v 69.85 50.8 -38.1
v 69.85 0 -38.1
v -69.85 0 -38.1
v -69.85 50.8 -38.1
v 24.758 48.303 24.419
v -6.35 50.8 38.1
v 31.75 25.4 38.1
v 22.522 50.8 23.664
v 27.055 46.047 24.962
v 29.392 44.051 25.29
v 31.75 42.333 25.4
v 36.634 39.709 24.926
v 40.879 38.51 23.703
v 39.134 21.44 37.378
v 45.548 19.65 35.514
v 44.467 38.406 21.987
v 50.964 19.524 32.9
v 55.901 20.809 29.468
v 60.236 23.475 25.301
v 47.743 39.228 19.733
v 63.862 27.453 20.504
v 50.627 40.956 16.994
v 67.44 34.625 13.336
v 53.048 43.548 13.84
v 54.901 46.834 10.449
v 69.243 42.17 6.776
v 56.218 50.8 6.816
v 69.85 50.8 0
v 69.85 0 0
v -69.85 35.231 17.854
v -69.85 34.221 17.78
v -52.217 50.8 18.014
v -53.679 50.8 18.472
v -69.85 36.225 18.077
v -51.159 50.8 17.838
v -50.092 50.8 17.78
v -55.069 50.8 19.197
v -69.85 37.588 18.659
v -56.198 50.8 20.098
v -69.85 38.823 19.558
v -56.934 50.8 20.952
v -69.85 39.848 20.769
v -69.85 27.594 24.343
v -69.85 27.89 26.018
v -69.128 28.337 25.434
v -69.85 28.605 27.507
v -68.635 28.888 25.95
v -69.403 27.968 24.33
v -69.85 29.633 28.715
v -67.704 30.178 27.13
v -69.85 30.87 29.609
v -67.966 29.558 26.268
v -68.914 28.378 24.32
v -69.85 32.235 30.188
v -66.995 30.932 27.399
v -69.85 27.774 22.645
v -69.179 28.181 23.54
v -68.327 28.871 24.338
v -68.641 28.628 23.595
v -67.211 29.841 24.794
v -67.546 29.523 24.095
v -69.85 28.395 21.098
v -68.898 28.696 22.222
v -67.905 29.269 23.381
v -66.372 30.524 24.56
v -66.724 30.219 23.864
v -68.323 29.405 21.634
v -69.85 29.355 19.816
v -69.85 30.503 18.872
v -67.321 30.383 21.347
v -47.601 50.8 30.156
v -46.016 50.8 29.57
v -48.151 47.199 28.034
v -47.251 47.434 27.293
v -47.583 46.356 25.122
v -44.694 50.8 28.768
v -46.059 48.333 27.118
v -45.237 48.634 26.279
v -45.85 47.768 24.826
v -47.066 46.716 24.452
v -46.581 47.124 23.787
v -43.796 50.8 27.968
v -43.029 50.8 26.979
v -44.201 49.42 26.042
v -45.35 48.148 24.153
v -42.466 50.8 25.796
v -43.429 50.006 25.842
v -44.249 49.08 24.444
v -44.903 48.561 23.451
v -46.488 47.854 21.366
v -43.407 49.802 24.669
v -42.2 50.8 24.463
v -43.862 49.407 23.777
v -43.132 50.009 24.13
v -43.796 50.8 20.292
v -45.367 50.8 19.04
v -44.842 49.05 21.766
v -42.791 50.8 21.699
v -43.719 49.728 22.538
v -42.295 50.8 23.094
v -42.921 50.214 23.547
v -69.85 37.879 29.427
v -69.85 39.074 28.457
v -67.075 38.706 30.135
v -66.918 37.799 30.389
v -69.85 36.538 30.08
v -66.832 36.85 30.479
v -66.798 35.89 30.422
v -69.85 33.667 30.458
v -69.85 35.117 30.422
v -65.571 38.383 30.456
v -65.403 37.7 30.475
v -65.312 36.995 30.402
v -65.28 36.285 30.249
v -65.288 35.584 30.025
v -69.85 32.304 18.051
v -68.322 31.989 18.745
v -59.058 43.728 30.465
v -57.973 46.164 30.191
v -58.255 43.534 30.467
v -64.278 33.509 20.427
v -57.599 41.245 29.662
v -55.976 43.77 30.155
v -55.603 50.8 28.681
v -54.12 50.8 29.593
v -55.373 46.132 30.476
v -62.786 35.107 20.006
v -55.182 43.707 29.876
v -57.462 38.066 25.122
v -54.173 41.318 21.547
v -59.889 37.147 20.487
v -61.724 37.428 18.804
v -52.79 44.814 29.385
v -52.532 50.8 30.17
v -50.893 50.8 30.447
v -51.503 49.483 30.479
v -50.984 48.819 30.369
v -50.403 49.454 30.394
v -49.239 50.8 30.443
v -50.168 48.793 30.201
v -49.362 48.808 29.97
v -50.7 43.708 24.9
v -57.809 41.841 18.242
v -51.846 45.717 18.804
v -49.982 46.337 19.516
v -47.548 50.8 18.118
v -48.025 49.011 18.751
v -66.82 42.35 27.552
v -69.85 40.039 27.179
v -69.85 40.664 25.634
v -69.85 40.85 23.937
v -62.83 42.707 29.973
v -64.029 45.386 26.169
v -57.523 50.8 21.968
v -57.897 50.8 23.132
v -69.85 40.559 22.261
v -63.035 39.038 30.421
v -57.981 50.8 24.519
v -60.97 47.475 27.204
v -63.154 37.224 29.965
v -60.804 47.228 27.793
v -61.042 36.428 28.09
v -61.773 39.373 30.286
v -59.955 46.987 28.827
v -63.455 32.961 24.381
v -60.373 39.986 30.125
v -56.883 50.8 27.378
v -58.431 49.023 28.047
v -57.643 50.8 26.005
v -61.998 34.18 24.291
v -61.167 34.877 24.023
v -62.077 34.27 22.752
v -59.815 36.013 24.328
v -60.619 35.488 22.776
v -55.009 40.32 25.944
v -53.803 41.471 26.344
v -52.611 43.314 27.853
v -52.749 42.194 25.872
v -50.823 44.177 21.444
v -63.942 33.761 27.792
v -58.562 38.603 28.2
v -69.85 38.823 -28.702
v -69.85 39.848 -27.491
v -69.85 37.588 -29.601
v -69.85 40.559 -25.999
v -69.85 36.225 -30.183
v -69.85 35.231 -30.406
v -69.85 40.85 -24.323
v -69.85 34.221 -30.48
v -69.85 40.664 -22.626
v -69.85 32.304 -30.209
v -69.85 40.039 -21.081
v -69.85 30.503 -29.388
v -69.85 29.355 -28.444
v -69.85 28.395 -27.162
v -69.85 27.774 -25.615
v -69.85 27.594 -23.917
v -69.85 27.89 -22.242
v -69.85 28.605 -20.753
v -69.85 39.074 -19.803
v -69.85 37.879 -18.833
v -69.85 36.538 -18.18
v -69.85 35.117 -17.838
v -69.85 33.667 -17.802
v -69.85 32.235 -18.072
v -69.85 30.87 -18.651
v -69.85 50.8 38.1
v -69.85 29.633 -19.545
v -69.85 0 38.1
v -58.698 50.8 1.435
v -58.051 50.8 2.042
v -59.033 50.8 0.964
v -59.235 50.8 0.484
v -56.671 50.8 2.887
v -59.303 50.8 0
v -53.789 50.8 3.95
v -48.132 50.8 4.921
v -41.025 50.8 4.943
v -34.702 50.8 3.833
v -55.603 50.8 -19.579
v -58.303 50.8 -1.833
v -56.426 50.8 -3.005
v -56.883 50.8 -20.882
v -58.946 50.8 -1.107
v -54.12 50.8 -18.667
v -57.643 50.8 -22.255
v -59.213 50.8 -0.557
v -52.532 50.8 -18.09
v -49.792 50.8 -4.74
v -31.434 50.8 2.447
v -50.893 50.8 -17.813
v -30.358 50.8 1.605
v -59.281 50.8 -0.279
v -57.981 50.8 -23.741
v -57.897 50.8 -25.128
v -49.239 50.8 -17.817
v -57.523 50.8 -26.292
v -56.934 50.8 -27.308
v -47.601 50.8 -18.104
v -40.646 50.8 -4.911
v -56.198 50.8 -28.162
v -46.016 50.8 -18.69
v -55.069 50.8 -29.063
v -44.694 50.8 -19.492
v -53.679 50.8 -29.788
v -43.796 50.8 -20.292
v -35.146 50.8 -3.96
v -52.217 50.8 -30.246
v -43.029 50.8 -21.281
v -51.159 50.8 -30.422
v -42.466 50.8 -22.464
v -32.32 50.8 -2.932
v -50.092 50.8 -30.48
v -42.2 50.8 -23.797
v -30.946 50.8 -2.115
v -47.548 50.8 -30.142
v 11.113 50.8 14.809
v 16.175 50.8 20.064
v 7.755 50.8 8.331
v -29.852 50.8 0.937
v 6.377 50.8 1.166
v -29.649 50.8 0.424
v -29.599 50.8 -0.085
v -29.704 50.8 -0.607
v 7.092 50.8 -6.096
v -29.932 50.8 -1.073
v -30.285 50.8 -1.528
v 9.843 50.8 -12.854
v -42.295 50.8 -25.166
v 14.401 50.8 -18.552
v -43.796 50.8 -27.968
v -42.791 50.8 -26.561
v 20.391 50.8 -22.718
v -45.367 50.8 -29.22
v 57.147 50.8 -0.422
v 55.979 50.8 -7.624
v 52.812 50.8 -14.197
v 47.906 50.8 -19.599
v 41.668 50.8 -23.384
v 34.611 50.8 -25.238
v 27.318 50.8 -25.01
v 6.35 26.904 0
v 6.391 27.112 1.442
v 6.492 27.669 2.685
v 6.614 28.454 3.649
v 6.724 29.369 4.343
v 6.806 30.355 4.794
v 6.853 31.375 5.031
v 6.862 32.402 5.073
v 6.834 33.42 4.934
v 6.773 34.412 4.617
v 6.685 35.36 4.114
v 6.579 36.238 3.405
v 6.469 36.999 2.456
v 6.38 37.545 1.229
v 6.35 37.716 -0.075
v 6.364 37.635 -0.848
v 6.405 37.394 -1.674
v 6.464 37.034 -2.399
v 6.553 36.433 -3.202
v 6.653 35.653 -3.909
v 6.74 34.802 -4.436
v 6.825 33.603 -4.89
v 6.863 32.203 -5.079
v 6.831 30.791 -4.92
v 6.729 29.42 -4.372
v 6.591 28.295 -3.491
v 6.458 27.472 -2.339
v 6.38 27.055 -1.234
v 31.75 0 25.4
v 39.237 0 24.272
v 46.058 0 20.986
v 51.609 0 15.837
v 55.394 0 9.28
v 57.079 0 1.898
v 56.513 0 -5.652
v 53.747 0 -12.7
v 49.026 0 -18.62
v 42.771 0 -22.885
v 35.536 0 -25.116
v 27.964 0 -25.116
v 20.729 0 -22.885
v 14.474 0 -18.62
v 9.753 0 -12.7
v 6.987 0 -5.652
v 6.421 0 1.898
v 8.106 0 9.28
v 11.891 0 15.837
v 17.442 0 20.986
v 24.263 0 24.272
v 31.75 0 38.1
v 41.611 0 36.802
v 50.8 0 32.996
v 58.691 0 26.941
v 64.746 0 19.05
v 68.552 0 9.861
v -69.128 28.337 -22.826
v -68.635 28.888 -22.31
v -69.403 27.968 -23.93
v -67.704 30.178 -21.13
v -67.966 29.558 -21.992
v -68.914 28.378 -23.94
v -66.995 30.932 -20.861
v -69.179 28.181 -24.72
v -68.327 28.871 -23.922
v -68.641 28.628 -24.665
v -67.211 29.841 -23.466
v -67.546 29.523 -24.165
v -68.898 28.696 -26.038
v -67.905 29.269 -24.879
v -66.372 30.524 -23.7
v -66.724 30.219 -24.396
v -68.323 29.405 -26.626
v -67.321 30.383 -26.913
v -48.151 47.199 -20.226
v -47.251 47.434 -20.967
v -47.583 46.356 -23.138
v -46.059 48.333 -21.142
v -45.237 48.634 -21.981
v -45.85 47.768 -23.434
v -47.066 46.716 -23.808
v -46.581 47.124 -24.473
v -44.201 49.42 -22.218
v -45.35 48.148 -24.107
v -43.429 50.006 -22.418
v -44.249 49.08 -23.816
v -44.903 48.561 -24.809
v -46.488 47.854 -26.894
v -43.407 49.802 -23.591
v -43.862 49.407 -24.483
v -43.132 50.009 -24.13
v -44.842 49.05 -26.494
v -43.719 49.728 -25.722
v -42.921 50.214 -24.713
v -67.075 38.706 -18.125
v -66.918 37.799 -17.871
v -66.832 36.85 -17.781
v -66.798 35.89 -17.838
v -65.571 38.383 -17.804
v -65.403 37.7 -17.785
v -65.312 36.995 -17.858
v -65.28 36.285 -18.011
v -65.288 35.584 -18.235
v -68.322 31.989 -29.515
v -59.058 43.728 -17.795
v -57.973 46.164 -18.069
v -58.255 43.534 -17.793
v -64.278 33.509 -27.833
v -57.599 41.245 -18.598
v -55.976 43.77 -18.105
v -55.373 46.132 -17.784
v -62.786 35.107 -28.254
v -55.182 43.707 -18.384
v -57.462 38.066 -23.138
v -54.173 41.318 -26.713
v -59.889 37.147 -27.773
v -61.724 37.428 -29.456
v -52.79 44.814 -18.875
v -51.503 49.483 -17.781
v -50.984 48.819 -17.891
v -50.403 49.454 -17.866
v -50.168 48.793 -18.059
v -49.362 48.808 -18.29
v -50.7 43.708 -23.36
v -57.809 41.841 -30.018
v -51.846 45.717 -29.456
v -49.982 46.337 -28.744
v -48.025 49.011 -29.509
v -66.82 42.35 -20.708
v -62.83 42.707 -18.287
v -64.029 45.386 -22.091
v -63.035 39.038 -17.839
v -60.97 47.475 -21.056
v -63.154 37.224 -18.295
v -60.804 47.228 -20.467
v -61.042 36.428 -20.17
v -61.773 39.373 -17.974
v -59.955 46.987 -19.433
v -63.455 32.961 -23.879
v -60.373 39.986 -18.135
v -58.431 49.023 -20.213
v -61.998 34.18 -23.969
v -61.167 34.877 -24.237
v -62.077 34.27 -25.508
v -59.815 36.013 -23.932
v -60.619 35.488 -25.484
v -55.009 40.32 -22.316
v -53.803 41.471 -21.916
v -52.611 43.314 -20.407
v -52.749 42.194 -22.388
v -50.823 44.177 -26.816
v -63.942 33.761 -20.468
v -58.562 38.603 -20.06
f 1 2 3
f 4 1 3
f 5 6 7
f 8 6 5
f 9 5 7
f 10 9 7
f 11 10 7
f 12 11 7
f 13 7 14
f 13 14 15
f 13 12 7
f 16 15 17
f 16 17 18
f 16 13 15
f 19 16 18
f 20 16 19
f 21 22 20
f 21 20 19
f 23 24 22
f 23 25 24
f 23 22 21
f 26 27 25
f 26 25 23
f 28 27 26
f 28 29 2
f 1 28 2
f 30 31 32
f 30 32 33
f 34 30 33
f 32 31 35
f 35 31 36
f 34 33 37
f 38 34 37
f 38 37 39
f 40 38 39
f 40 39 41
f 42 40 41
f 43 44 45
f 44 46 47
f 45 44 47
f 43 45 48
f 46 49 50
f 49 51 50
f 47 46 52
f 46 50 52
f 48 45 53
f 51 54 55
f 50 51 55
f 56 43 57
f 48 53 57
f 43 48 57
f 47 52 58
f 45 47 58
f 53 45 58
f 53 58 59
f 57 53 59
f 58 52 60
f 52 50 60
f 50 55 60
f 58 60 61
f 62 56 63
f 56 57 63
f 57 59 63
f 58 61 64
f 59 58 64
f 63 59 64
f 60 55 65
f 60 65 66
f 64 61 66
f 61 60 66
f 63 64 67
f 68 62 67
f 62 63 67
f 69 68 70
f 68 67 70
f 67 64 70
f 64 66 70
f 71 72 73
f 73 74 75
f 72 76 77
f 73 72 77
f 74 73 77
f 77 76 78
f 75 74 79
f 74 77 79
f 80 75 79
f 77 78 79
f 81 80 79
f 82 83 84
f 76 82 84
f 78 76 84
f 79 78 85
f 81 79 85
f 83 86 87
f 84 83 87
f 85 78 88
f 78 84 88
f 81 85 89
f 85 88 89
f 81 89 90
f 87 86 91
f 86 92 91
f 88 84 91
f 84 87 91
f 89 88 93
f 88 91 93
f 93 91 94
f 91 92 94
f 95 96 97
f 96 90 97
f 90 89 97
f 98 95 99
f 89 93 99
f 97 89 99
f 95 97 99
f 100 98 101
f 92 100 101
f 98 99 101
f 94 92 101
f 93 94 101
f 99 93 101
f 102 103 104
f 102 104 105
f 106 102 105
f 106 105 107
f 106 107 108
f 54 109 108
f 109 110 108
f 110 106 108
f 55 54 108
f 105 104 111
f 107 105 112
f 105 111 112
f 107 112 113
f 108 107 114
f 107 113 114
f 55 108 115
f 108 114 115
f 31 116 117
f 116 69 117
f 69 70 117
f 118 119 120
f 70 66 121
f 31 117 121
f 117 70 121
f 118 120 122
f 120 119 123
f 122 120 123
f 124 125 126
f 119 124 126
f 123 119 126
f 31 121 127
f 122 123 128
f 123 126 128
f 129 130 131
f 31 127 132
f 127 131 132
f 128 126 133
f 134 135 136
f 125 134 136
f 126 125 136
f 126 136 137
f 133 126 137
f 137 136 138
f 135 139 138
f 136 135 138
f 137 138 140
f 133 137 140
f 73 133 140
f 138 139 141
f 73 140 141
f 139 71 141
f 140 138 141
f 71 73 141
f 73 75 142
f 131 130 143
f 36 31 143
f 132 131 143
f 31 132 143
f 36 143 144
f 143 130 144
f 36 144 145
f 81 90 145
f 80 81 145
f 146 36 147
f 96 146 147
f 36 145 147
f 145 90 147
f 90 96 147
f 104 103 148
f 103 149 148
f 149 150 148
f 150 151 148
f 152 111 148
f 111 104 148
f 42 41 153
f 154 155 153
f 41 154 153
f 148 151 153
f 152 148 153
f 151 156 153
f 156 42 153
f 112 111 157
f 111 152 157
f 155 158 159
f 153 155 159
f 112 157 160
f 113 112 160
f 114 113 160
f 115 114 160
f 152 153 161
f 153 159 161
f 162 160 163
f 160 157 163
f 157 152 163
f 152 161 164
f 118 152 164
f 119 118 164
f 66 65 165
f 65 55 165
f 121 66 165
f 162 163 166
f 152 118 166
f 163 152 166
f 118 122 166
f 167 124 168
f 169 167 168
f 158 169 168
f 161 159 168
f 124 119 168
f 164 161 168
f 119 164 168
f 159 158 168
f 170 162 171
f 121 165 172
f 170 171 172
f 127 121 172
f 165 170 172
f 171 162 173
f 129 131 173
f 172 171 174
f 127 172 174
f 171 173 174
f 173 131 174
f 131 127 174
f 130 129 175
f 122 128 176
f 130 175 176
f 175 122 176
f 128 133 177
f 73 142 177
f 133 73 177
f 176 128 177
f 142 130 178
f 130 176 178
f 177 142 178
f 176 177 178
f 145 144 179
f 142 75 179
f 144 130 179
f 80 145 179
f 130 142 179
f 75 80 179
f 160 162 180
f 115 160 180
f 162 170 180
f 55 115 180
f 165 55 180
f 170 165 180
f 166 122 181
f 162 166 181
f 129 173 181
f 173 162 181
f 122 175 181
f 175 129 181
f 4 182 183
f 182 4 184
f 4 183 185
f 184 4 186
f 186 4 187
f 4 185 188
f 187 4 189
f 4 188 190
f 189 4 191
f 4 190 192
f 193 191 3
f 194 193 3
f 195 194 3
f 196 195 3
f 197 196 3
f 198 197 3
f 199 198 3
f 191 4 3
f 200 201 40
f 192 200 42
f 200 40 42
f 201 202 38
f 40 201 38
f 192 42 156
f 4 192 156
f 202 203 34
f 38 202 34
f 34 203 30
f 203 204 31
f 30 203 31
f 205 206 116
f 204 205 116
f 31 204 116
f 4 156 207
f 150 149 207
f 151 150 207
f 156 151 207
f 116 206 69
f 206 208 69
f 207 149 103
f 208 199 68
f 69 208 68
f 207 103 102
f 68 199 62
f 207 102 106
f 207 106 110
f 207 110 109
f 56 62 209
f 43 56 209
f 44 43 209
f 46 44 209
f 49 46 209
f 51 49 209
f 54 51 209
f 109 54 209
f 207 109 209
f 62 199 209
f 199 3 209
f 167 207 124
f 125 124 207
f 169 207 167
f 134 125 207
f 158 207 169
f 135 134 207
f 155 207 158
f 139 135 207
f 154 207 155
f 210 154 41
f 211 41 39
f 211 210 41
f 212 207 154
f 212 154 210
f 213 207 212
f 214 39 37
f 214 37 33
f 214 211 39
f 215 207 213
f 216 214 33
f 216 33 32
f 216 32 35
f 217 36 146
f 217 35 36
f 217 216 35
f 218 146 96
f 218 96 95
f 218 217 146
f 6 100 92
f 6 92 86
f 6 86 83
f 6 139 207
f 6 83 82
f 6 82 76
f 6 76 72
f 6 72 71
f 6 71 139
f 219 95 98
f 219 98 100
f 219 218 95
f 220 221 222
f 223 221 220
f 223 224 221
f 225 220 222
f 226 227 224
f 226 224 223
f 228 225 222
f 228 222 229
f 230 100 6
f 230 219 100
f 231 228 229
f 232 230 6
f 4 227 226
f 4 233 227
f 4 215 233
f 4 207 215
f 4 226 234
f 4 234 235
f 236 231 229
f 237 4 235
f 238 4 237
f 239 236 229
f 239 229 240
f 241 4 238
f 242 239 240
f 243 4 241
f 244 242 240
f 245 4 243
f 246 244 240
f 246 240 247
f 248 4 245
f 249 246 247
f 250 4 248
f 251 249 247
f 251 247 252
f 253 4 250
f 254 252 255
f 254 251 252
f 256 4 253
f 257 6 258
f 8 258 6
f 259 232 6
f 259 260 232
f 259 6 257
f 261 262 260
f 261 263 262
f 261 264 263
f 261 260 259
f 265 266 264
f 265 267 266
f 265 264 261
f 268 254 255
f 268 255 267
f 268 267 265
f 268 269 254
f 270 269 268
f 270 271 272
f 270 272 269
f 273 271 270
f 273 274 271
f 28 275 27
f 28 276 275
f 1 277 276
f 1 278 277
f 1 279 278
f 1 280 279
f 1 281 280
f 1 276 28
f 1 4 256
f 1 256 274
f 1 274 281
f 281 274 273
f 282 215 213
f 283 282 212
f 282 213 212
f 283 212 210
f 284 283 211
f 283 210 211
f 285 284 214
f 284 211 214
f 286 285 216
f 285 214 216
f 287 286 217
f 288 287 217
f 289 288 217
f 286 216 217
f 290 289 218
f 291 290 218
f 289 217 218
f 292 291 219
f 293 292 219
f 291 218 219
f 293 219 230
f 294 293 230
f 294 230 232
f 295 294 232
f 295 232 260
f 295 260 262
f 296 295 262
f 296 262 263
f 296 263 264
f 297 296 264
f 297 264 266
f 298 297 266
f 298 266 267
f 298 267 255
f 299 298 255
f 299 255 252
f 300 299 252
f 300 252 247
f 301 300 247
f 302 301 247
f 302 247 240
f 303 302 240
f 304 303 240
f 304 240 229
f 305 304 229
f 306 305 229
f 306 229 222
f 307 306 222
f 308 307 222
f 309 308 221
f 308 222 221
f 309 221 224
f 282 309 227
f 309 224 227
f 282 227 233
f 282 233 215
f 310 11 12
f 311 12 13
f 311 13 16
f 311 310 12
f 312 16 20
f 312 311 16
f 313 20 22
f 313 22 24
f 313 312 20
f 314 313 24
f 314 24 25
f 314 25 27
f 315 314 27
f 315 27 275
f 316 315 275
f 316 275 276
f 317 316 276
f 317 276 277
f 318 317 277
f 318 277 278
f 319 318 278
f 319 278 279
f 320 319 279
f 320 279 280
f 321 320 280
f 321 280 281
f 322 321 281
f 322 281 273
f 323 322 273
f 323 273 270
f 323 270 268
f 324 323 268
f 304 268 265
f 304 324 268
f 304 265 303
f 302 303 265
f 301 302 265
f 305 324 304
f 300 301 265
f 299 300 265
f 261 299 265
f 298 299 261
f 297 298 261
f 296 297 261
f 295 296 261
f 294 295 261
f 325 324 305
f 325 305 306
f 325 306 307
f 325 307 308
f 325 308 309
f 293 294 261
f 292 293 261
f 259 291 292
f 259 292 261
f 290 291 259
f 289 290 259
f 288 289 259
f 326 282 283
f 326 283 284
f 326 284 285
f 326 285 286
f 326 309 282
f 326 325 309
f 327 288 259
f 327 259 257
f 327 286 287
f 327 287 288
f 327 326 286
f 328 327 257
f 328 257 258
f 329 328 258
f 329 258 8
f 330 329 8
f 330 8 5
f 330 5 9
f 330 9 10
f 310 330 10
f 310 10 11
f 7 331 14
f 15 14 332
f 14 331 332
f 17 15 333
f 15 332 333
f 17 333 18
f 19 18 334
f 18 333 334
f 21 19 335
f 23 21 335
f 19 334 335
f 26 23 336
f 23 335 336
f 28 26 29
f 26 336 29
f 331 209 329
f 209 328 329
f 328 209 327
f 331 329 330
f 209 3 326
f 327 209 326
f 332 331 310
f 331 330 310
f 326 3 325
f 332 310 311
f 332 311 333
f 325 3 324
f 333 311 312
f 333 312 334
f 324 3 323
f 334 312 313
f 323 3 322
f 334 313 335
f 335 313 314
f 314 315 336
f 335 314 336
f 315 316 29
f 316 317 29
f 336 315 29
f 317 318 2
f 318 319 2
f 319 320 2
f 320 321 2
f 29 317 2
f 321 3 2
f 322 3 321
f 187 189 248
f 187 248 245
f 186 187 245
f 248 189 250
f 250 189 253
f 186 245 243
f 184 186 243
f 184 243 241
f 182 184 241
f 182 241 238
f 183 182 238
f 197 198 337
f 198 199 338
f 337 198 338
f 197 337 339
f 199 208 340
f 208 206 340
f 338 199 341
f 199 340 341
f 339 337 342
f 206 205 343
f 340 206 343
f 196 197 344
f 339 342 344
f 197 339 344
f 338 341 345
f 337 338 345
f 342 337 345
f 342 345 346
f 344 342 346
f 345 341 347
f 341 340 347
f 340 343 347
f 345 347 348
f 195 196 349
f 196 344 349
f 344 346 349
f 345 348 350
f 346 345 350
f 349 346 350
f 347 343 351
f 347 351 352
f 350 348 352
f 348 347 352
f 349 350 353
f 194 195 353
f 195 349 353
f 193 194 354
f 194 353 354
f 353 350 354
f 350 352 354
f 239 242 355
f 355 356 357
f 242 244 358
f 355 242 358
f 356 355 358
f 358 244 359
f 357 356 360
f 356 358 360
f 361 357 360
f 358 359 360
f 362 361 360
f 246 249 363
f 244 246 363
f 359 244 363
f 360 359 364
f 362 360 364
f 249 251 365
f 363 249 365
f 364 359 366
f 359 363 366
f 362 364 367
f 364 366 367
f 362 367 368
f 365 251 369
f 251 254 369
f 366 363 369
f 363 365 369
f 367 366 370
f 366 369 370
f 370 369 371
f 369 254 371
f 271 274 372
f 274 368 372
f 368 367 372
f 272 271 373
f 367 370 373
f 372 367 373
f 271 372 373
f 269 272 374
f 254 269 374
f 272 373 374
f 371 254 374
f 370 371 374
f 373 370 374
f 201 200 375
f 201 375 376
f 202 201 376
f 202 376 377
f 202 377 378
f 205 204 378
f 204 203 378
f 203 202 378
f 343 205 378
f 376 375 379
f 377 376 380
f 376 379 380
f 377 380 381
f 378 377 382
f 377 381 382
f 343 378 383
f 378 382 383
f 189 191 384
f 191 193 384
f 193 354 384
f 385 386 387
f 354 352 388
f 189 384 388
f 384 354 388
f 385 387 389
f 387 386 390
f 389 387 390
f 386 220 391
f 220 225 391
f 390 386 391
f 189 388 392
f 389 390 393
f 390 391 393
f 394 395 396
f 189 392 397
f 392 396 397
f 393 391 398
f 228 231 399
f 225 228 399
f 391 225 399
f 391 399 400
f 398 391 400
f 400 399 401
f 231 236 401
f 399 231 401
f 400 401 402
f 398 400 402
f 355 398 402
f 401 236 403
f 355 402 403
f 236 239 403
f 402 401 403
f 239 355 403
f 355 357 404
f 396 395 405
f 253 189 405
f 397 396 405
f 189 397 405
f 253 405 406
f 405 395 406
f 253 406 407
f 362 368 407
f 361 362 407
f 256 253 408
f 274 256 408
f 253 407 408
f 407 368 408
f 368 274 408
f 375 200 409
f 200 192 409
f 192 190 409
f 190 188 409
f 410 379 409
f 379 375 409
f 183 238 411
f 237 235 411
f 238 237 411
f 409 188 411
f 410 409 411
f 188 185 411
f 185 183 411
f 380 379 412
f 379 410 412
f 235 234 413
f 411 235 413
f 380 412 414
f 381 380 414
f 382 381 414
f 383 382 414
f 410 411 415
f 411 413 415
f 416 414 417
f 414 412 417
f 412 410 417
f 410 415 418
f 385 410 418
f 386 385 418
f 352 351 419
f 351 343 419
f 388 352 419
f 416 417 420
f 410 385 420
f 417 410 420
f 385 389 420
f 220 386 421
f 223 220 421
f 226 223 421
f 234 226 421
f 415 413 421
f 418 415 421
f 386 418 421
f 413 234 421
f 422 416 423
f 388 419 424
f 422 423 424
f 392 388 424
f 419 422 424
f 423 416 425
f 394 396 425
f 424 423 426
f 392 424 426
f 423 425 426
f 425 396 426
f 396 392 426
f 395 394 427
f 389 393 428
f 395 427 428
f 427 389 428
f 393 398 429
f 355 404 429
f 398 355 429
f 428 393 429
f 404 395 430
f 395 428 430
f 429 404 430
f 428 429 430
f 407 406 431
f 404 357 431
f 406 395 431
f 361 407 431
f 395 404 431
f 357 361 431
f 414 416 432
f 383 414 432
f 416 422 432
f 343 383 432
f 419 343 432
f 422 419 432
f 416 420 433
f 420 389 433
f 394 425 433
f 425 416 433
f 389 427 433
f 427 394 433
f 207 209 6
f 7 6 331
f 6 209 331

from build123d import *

# Parameters (mm, degrees)
SKETCH1_R               = 25.4
BOSS_EXTRUDE1_DEPTH     = 50.8
SKETCH3_R               = 57.740846599
CUT_EXTRUDE1_DEPTH      = 124.114128787
SKETCH4_RX              = 6.35
SKETCH4_RY              = 5.08
CUT_EXTRUDE2_DEPTH      = 152.575785835
CUT_EXTRUDE3_REACH      = 157.303
CUT_EXTRUDE3_END_RADIUS = 25.4
SKETCH6_R               = 5.08


with BuildPart() as part:
    # Sketch1 → Boss-Extrude1 (new body)
    with BuildSketch(Plane(origin=(0, 0, 0), x_dir=(1, 0, 0), z_dir=(0, 1, 0))):
        with BuildLine():
            Line((-69.85, -38.1), (31.75, -38.1))
            ThreePointArc((31.75, -38.1), (58.690768363, -26.940768363), (69.85, 0))
            Line((69.85, 0), (69.85, 38.1))
            Line((69.85, 38.1), (-69.85, 38.1))
            Line((-69.85, 38.1), (-69.85, -38.1))
        make_face()
        with Locations(Location((31.75, 0, 0), (0, 0, 270))):
            Circle(SKETCH1_R, mode=Mode.SUBTRACT)
    extrude(amount=BOSS_EXTRUDE1_DEPTH)

    # Sketch3 → Cut-Extrude1 (cut, through all)
    with BuildSketch(Plane(origin=(20.144827586, 30.217241379, 40.289655172), x_dir=(0.928476690885259, -0.22283440581246322, -0.2971125410832833), z_dir=(0.3713906763541046, 0.5570860145311567, 0.7427813527082063))):
        with Locations((6.839159305, 17.78)):
            Circle(SKETCH3_R)
    extrude(amount=CUT_EXTRUDE1_DEPTH, mode=Mode.SUBTRACT)

    # Sketch4 → Cut-Extrude2 (cut, through all)
    with BuildSketch(Plane(origin=(66.003779532, 55.383747061, 0), x_dir=(0, 0, -1), z_dir=(0.7660444431189792, 0.6427876096865379, 0))):
        with Locations((-24.13, 71.113772247)):
            Ellipse(SKETCH4_RX, SKETCH4_RY)
        with Locations((24.13, 71.113772247)):
            Ellipse(SKETCH4_RX, SKETCH4_RY)
    extrude(amount=-CUT_EXTRUDE2_DEPTH, mode=Mode.SUBTRACT)

    # Cut-Extrude3: up to this cylinder (the profile starts outside it)
    cut_extrude3_end = Plane(origin=(31.75, 58.963403, 0), z_dir=(0, -1, 0)) * Cylinder(CUT_EXTRUDE3_END_RADIUS, 366.406, mode=Mode.PRIVATE)
    # Sketch6 → Cut-Extrude3 (cut, up to the surface)
    with BuildSketch(Plane(origin=(-78.005907462, 28.391828413, 0), x_dir=(0, 0, 1), z_dir=(-0.9396926207859093, 0.34202014332566605, 0)), mode=Mode.PRIVATE) as cut_extrude3_sk1:
        with Locations(Location((0, 32.533589765, 0), (0, 0, 270))):
            Circle(SKETCH6_R)
    cut_extrude3_tool1 = extrude(cut_extrude3_sk1.sketch, amount=-CUT_EXTRUDE3_REACH, mode=Mode.PRIVATE) - cut_extrude3_end
    add(cut_extrude3_tool1.solids().sort_by_distance((-66.878764, 58.963403, 0))[0], mode=Mode.SUBTRACT)


solid = part.part
